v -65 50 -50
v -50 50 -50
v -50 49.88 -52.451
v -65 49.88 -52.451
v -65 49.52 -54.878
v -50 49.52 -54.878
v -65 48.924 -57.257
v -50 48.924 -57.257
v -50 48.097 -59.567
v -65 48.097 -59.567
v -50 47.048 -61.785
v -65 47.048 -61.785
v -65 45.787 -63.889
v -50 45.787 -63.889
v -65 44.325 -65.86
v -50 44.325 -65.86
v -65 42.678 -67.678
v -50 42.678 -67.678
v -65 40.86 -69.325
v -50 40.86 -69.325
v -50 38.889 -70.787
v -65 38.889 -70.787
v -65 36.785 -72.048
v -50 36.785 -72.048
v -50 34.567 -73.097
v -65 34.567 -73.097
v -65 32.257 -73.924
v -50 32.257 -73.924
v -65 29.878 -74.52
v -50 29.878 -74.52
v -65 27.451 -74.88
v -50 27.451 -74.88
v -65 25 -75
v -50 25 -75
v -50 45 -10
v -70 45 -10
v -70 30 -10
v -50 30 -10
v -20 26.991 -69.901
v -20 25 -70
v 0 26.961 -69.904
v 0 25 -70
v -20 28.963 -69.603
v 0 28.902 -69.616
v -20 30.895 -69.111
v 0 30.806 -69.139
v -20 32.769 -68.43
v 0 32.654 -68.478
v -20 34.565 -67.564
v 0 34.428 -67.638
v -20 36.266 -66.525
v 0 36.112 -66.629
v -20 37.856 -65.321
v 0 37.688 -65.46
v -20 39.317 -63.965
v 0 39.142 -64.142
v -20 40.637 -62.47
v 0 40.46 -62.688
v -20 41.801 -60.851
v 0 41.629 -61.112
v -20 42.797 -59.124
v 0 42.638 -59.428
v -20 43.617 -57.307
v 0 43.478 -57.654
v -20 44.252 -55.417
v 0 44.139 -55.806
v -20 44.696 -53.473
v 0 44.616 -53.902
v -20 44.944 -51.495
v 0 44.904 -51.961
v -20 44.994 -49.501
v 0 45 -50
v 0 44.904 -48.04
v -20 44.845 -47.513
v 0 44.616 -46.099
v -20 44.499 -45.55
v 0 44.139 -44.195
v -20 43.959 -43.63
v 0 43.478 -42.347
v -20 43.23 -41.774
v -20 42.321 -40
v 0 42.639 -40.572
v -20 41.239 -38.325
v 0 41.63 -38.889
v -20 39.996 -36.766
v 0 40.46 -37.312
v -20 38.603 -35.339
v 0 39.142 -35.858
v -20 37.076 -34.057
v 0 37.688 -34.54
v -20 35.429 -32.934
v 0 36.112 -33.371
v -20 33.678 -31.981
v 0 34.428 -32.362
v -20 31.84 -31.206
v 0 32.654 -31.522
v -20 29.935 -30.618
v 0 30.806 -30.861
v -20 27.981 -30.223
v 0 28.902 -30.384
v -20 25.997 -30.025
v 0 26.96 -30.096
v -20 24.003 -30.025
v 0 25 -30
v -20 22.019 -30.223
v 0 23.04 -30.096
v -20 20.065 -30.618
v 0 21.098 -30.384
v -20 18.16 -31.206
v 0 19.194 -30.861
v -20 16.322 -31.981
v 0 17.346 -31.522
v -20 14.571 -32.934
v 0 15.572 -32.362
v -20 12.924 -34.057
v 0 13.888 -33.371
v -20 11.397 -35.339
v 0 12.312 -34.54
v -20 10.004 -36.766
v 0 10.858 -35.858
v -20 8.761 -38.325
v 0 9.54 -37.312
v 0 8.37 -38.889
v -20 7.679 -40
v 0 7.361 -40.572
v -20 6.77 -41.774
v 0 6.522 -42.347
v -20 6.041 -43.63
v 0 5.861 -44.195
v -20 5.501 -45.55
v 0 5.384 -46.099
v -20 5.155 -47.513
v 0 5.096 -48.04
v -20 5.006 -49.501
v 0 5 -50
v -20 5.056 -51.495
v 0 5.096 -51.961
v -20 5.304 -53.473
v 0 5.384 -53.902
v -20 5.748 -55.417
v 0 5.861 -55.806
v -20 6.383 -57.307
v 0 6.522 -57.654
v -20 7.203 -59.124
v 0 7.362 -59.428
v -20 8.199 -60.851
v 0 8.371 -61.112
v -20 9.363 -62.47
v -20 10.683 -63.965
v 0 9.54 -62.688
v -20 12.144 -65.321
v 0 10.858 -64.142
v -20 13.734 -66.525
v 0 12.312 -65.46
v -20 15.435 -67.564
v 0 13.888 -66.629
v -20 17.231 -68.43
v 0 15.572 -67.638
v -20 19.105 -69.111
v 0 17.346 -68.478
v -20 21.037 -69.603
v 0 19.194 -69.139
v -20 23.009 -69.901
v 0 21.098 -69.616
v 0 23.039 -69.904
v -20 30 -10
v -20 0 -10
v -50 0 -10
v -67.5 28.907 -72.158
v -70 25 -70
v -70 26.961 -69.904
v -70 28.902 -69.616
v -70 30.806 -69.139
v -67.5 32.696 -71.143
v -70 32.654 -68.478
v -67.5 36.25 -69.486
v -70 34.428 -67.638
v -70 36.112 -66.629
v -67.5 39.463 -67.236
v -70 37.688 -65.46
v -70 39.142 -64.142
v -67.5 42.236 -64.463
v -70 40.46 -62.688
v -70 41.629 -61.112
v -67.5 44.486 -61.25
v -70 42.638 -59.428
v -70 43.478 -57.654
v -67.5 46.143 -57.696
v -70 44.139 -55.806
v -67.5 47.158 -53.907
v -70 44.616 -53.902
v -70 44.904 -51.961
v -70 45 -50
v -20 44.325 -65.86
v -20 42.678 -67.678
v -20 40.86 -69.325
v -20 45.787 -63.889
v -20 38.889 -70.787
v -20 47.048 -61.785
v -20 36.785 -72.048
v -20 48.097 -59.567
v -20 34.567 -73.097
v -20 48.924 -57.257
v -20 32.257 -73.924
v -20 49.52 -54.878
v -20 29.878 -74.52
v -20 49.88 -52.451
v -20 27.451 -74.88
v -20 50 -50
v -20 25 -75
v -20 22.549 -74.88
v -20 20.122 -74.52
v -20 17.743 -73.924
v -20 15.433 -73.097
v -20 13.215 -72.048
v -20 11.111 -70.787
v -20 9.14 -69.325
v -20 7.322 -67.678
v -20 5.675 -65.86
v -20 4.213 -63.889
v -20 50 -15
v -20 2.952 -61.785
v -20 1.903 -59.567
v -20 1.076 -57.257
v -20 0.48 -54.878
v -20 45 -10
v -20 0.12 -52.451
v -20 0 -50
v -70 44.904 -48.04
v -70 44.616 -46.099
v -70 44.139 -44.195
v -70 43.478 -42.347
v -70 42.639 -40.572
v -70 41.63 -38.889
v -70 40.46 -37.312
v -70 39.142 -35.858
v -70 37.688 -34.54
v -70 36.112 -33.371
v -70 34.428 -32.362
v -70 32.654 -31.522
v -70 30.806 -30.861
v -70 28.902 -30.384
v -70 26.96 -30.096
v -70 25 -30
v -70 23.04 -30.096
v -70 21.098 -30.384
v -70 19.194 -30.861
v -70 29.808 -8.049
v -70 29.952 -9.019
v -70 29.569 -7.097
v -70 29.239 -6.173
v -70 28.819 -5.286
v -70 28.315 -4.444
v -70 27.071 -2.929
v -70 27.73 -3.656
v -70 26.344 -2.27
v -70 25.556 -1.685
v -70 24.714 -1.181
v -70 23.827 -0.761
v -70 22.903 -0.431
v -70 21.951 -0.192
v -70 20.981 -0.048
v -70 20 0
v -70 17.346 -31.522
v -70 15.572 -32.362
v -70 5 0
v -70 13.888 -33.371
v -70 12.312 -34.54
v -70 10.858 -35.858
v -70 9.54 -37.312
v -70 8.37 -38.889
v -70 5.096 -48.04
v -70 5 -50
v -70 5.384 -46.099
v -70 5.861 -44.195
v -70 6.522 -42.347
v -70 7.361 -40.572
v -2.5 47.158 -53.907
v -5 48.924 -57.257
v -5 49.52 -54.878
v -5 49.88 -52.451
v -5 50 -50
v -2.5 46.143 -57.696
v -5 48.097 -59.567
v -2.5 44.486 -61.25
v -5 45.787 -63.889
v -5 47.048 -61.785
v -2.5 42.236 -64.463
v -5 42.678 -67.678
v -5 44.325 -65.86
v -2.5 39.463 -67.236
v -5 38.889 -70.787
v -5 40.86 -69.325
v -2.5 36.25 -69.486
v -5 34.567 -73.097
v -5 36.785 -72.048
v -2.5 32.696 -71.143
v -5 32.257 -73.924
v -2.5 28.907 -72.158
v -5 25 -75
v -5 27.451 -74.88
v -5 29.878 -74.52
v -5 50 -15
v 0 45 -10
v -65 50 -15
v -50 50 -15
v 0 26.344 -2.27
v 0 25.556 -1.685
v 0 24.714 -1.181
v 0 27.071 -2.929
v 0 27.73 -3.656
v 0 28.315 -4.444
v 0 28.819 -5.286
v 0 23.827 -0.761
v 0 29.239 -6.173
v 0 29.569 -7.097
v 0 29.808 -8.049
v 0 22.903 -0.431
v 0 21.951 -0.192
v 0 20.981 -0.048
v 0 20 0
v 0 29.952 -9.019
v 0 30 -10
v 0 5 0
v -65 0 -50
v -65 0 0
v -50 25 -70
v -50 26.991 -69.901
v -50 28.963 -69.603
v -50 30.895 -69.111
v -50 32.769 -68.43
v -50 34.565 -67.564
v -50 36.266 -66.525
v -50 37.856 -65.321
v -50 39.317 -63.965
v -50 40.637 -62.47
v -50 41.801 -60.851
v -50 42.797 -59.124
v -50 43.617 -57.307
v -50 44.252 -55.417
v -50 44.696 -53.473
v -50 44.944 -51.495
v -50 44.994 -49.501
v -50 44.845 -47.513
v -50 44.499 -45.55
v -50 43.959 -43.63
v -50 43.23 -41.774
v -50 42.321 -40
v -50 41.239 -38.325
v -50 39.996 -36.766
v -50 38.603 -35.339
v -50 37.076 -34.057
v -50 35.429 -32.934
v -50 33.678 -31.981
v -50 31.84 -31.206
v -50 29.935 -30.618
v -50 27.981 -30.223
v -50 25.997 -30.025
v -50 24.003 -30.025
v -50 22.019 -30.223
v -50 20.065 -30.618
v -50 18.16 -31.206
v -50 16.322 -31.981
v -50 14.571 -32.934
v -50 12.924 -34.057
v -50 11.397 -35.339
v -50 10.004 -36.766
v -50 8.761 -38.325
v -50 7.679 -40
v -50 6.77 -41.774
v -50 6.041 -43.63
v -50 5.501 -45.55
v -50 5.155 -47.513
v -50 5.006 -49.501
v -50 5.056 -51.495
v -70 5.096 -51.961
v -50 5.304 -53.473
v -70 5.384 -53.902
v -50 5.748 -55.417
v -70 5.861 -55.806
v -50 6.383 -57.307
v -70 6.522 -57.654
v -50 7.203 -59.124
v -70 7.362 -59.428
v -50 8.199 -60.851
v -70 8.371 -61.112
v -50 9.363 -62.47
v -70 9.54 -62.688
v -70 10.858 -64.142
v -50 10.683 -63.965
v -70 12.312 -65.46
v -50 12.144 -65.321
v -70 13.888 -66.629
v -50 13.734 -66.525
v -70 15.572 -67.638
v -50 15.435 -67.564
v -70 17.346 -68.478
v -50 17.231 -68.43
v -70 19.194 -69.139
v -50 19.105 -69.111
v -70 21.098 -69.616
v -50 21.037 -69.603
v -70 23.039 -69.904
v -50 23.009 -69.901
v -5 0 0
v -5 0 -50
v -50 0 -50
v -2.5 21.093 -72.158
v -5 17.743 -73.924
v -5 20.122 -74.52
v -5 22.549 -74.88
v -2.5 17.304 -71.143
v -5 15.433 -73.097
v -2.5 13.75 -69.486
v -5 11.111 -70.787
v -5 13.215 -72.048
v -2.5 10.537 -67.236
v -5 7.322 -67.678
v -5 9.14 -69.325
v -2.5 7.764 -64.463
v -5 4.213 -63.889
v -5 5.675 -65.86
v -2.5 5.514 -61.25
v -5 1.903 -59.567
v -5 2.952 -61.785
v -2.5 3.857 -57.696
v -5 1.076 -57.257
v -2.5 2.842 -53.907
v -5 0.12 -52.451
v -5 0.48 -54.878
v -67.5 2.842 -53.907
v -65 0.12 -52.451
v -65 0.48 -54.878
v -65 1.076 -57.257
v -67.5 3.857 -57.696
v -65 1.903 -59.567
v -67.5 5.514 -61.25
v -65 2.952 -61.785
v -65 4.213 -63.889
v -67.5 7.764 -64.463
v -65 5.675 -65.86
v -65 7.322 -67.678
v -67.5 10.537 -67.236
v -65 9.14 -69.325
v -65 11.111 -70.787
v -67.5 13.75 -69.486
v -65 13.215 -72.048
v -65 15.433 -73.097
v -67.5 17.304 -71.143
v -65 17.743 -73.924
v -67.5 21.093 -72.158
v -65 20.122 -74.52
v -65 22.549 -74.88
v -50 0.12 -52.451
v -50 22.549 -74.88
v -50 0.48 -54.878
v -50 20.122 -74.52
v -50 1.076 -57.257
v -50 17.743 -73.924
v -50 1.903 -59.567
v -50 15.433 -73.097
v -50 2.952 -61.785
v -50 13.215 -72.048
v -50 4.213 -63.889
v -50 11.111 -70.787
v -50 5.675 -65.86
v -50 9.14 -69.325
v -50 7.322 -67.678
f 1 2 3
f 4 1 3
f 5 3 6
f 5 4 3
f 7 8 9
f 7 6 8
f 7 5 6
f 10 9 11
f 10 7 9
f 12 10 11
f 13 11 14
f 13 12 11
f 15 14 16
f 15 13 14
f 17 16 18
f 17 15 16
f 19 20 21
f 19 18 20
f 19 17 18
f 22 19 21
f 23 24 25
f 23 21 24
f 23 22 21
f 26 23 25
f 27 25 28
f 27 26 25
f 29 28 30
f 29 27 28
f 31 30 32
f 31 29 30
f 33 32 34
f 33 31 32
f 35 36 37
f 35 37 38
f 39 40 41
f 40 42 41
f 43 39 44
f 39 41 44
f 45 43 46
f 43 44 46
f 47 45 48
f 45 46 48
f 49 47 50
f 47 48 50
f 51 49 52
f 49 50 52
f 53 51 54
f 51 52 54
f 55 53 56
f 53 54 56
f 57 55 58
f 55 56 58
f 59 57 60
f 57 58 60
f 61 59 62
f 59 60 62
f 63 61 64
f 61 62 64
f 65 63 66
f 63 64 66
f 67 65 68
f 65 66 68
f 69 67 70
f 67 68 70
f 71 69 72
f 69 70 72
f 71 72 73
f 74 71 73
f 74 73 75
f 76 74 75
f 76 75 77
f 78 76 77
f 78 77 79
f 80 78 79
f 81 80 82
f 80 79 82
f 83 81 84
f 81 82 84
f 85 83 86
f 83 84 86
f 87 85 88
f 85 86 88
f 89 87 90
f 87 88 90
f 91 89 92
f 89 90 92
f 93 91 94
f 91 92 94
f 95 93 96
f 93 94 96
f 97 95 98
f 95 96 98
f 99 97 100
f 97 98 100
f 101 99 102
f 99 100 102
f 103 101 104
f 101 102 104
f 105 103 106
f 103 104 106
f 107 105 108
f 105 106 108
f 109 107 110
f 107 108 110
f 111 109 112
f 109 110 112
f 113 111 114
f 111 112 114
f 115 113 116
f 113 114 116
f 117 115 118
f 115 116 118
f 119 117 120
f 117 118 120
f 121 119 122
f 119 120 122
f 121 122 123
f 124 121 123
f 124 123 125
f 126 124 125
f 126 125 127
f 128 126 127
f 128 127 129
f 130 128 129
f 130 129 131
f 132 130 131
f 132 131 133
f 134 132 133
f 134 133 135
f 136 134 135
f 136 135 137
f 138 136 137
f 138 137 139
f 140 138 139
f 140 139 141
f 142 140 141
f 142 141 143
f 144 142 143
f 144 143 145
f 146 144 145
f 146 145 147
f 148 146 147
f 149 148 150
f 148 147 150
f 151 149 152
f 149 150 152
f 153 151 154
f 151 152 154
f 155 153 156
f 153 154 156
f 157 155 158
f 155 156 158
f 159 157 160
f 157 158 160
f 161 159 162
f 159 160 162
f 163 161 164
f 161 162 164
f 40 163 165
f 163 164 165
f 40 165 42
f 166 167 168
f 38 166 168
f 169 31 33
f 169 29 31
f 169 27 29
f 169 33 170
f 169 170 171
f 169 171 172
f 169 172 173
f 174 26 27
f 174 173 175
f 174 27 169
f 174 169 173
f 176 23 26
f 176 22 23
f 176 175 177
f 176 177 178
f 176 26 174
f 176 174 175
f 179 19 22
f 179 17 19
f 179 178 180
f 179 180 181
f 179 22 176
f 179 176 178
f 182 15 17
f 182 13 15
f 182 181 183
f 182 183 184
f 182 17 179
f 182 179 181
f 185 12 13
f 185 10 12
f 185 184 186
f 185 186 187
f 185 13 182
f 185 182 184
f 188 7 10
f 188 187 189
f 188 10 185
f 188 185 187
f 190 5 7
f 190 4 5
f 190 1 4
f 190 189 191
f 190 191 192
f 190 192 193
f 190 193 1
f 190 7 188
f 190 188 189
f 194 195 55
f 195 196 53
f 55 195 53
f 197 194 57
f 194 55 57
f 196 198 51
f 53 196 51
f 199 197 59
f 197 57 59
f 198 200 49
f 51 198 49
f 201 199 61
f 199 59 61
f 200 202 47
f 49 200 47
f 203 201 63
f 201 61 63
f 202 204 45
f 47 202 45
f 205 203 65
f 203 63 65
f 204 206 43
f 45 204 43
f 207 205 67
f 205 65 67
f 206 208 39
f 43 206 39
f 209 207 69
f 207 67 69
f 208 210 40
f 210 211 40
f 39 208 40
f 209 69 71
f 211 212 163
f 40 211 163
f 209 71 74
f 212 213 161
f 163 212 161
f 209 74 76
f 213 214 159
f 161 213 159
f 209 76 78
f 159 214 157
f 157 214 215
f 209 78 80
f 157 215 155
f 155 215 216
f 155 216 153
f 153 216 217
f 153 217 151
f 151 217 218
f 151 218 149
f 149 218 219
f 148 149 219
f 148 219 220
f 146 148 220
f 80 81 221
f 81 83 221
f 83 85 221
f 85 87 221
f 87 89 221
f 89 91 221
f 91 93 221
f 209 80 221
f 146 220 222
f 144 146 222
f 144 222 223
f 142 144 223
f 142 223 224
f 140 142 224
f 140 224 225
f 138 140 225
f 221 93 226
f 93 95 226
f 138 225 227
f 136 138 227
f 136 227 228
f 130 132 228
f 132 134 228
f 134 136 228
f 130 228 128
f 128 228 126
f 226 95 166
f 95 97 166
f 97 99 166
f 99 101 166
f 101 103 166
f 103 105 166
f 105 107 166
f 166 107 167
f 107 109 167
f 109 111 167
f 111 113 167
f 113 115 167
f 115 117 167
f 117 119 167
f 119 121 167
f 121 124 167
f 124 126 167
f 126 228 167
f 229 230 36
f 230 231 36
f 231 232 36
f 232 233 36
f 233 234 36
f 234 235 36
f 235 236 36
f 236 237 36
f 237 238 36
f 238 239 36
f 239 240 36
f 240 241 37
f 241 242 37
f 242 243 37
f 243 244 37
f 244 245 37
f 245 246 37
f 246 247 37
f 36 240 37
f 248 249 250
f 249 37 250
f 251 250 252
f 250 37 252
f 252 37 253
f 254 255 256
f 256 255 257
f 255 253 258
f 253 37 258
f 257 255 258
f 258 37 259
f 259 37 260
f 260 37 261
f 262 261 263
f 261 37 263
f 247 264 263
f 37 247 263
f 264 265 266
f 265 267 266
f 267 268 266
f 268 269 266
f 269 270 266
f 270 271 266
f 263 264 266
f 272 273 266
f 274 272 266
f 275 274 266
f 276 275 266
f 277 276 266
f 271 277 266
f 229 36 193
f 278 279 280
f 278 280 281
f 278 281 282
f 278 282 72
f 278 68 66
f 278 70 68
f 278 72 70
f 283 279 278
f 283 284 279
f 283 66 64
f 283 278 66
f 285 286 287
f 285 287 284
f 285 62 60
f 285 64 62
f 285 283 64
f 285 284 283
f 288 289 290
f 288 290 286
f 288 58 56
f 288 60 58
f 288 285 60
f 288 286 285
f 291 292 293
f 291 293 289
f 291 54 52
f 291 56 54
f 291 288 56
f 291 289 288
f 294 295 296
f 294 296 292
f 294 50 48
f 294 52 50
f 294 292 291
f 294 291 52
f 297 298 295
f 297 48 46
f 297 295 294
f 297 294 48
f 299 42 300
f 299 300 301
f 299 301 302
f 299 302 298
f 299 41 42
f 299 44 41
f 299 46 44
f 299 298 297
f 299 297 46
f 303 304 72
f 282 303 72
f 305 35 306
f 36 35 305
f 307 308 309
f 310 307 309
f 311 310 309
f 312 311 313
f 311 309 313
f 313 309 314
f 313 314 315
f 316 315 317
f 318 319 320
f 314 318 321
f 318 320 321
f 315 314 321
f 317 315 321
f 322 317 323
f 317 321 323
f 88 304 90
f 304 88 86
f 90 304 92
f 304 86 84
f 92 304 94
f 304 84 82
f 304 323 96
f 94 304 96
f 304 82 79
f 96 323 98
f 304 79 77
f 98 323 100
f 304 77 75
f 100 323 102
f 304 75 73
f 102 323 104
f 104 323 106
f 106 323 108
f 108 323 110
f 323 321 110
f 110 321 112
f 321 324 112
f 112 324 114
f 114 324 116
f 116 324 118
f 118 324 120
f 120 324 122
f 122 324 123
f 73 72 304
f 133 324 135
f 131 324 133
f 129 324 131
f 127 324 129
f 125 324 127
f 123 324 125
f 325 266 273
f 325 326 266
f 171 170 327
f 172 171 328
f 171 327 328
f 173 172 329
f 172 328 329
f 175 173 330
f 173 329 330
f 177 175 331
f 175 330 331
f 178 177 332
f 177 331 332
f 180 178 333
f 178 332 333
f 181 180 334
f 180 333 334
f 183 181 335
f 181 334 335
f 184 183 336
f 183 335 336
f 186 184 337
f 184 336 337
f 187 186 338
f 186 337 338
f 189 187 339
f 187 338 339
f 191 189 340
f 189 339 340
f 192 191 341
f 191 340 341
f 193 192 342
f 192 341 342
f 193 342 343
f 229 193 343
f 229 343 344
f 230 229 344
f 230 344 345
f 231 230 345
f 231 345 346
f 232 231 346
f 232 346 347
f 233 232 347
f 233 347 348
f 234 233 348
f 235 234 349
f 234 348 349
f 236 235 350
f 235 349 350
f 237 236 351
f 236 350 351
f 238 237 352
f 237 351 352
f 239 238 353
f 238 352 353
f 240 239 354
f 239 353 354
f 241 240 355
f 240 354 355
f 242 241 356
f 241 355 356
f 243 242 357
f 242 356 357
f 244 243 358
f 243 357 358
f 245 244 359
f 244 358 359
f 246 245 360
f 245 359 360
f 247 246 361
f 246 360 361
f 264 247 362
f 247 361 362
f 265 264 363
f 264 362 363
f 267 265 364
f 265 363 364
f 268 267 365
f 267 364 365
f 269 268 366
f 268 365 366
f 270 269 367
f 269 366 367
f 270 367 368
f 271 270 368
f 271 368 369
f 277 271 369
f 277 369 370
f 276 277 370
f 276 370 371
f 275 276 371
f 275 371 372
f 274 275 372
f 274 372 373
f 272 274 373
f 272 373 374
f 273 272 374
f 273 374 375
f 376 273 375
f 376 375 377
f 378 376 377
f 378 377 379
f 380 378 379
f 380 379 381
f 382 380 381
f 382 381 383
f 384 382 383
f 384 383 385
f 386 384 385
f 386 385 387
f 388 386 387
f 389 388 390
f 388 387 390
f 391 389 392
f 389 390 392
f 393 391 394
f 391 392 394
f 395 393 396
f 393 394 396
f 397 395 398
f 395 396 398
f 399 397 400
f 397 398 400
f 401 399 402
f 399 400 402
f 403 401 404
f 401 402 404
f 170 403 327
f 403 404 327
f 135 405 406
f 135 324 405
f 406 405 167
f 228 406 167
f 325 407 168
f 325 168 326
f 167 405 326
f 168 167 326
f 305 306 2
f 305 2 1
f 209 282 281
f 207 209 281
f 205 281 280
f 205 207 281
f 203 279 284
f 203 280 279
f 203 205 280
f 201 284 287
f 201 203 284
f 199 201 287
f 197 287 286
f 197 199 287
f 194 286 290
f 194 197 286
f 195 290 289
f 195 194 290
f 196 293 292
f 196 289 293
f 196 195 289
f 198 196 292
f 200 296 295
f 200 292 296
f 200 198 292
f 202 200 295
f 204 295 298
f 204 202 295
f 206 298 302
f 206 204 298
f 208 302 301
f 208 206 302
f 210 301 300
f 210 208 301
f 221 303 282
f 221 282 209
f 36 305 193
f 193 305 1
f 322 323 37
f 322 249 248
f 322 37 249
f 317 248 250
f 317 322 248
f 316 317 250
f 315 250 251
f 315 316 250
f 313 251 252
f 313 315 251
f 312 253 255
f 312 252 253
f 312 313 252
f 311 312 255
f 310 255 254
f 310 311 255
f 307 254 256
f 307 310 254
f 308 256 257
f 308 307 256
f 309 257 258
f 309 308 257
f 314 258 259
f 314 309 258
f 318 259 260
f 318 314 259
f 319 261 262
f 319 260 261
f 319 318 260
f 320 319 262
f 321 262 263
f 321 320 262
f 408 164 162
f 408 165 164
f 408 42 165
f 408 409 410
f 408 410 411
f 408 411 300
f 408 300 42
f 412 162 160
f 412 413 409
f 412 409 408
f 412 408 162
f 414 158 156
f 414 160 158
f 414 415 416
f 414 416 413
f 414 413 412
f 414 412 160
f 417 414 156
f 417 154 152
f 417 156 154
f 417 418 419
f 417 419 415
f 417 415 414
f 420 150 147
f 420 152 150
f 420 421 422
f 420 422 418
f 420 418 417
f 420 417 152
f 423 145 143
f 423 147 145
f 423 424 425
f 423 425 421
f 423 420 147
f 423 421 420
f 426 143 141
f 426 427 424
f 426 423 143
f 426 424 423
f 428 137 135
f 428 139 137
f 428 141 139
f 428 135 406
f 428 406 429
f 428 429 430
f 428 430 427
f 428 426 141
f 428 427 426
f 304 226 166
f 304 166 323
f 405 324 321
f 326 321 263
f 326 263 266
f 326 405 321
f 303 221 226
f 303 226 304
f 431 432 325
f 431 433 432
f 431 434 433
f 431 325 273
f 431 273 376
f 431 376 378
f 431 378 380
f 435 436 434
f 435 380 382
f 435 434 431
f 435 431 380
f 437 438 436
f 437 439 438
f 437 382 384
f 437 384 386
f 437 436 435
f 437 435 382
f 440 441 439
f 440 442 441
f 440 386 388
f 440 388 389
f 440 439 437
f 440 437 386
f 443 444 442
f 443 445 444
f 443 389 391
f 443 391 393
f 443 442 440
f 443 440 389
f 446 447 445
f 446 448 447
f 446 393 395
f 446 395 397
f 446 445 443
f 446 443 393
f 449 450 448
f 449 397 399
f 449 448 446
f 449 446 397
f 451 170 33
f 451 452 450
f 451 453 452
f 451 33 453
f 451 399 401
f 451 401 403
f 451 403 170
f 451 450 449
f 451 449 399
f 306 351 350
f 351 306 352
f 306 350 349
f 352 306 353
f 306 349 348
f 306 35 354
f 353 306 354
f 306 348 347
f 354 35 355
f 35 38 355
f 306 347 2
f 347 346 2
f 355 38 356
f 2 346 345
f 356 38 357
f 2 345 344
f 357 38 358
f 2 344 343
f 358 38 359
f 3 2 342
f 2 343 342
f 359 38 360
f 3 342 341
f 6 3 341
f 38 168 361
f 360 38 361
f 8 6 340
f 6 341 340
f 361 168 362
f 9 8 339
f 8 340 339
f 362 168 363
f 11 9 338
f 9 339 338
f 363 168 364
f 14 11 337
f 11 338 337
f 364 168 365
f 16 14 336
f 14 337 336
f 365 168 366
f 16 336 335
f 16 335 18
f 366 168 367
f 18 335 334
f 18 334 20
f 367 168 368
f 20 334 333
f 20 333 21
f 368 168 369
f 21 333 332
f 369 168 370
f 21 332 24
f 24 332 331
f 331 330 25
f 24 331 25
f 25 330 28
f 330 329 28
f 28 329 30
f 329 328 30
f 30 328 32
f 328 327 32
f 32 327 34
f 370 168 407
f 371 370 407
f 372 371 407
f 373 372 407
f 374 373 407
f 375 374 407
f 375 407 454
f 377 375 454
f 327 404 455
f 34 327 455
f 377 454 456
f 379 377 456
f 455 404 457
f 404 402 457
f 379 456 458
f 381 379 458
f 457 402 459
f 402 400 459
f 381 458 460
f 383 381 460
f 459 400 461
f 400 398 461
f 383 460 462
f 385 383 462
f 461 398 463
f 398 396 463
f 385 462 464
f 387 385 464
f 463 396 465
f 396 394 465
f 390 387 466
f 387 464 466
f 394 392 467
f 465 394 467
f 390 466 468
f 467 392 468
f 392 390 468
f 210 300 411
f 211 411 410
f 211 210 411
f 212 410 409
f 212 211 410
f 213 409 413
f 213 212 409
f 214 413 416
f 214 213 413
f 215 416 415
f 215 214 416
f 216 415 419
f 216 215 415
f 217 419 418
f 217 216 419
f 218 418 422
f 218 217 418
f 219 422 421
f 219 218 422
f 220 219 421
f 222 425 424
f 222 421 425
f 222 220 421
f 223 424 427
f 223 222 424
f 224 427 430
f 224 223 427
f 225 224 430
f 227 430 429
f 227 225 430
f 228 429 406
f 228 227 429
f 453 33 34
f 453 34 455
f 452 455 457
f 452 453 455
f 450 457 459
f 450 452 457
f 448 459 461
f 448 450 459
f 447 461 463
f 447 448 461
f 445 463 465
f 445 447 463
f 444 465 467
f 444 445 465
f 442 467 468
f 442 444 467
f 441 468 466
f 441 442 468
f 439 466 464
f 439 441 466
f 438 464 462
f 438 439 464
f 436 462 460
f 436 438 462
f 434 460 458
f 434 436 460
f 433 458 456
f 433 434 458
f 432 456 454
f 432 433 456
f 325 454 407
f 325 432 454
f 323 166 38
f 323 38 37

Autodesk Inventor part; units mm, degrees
ref_plane "YZ Plane" through (0, 0, 0) normal (1, 0, 0) x (0, 1, 0)
ref_plane "XZ Plane" through (0, 0, 0) normal (0, 1, 0) x (-1, 0, 0)
ref_plane "XY Plane" through (0, 0, 0) normal (0, 0, 1) x (1, 0, 0)
sketch "Sketch1" plane through (0, 0, 0) normal (0, 1, 0) x (-1, 0, 0)
  line L0 (0, 0) -> (70, 0)
  line L1 (70, 0) -> (70, -84.6705) construction
  line L2 (0, -84.6705) -> (0, 0) construction
  line L3 (70, 0) -> (0, 0) construction
  line L4 (0, 0) -> (0, -75)
  line L5 (0, -75) -> (20, -75)
  line L6 (20, -75) -> (20, -10)
  line L7 (20, -10) -> (50, -10)
  line L8 (50, -10) -> (50, -75)
  line L9 (50, -75) -> (70, -75)
  line L10 (70, -75) -> (70, 0)
  dimension "d0" = 70
  dimension "d1" = 20
  dimension "d2" = 30
  dimension "d3" = 20
  dimension "d4" = 10
  dimension "d20" = 65
extrude "Extrusion1" add sketch "Sketch1" along normal blind 50
sketch "Sketch2" plane through (0, 50, 0) normal (0, 1, 0) x (1, 0, 0)
  line L0 (-70, 0) -> (0, 0) projected
  line L1 (0, 0) -> (-70, 0)
  line L2 (-70, 0) -> (-70, 10)
  line L3 (-70, 10) -> (0, 10)
  line L4 (0, 10) -> (0, 0)
  dimension "d7" = 70
  dimension "d8" = 10
extrude "Extrusion2" cut sketch "Sketch2" against normal blind 20
fillet "Fillet1" radius 10 1 edges at (-35, 30, 0)
fillet "Fillet2" radius 25 4 edges at (-10, 50, -75) (-10, 0, -75) (-60, 0, -75) (-60, 50, -75)
chamfer "Chamfer1" distance 5 angle 45 8 edges at (0, 0, -25.0003) (0, 42.6778, -67.6778) (0, 50, -30.0003) (-70, 50, -30.0002) (-70, 7.3222, -67.6778) (-70, 0, -25.0002) (-60, 50, -10) (-10, 50, -10)
sketch "Sketch4" plane through (0, 25, -50) normal (1, 0, 0) x (0, 0, -1)
  circle A0 centre (0, 0) radius 20
  point P0 (-50, -25)
  dimension "d17" = 40
extrude "Extrusion3" cut sketch "Sketch4" against normal through all
properties part number "dhillg25_Lab2"
